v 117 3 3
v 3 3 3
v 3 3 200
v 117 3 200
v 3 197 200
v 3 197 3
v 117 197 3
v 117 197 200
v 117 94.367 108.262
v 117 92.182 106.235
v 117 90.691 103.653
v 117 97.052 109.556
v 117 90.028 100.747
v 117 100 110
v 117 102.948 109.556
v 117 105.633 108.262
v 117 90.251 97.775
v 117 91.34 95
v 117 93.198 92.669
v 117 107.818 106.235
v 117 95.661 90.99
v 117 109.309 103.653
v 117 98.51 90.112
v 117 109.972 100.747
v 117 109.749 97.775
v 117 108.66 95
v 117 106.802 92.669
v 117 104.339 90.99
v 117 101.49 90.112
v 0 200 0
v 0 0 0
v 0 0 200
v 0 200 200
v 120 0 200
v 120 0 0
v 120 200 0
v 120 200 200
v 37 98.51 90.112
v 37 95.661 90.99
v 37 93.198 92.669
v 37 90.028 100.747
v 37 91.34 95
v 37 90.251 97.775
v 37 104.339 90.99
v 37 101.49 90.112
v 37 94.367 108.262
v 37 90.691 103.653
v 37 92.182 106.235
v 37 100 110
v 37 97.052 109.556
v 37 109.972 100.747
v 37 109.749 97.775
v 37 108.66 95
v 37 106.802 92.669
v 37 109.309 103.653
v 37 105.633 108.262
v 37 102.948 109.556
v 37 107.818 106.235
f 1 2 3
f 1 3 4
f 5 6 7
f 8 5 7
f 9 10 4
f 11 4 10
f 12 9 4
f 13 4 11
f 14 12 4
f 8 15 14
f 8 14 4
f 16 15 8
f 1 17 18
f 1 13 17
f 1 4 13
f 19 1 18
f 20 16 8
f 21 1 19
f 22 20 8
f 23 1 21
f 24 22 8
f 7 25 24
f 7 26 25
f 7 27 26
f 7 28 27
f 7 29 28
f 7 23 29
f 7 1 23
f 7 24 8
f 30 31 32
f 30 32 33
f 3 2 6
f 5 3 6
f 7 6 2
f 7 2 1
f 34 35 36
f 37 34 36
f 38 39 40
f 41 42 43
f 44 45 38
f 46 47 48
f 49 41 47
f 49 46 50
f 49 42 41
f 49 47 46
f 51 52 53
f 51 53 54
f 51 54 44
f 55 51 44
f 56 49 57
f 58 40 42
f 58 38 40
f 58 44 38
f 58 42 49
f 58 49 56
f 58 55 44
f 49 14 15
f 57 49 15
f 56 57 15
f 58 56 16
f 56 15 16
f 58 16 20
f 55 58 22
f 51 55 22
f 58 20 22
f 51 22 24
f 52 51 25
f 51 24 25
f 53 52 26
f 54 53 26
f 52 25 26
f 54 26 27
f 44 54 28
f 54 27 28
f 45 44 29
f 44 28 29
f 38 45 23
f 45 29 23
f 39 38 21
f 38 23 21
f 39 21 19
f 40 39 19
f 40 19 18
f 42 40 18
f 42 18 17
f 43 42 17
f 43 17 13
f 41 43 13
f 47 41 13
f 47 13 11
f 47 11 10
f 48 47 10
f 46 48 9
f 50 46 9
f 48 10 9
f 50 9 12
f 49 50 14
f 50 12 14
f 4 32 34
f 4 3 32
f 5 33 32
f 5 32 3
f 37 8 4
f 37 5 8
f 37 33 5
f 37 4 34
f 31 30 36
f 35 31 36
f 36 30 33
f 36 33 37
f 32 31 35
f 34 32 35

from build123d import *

# Parameters (mm, degrees)
CROQUIS2_W              = 120
CROQUIS2_H              = 200
SALIENTE_EXTRUIR1_DEPTH = 200
VACIADO1_T              = -3
CROQUIS4_R              = 10
SALIENTE_EXTRUIR2_DEPTH = 80


with BuildPart() as part:
    # Croquis2 → Saliente-Extruir1 (new body)
    with BuildSketch(Plane.XY):
        with Locations((60, 100)):
            Rectangle(CROQUIS2_W, CROQUIS2_H)
    extrude(amount=SALIENTE_EXTRUIR1_DEPTH)

    # Vaciado1
    vaciado1_openings = [part.faces().sort_by_distance(p)[0] for p in [
        (60, 100, 200),
    ]]
    offset(amount=VACIADO1_T, openings=vaciado1_openings, kind=Kind.INTERSECTION)

    # Croquis4 → Saliente-Extruir2 (add)
    with BuildSketch(Plane.ZY.offset(-117)):
        with Locations((100, 100)):
            Circle(CROQUIS4_R)
    extrude(amount=SALIENTE_EXTRUIR2_DEPTH)


solid = part.part
